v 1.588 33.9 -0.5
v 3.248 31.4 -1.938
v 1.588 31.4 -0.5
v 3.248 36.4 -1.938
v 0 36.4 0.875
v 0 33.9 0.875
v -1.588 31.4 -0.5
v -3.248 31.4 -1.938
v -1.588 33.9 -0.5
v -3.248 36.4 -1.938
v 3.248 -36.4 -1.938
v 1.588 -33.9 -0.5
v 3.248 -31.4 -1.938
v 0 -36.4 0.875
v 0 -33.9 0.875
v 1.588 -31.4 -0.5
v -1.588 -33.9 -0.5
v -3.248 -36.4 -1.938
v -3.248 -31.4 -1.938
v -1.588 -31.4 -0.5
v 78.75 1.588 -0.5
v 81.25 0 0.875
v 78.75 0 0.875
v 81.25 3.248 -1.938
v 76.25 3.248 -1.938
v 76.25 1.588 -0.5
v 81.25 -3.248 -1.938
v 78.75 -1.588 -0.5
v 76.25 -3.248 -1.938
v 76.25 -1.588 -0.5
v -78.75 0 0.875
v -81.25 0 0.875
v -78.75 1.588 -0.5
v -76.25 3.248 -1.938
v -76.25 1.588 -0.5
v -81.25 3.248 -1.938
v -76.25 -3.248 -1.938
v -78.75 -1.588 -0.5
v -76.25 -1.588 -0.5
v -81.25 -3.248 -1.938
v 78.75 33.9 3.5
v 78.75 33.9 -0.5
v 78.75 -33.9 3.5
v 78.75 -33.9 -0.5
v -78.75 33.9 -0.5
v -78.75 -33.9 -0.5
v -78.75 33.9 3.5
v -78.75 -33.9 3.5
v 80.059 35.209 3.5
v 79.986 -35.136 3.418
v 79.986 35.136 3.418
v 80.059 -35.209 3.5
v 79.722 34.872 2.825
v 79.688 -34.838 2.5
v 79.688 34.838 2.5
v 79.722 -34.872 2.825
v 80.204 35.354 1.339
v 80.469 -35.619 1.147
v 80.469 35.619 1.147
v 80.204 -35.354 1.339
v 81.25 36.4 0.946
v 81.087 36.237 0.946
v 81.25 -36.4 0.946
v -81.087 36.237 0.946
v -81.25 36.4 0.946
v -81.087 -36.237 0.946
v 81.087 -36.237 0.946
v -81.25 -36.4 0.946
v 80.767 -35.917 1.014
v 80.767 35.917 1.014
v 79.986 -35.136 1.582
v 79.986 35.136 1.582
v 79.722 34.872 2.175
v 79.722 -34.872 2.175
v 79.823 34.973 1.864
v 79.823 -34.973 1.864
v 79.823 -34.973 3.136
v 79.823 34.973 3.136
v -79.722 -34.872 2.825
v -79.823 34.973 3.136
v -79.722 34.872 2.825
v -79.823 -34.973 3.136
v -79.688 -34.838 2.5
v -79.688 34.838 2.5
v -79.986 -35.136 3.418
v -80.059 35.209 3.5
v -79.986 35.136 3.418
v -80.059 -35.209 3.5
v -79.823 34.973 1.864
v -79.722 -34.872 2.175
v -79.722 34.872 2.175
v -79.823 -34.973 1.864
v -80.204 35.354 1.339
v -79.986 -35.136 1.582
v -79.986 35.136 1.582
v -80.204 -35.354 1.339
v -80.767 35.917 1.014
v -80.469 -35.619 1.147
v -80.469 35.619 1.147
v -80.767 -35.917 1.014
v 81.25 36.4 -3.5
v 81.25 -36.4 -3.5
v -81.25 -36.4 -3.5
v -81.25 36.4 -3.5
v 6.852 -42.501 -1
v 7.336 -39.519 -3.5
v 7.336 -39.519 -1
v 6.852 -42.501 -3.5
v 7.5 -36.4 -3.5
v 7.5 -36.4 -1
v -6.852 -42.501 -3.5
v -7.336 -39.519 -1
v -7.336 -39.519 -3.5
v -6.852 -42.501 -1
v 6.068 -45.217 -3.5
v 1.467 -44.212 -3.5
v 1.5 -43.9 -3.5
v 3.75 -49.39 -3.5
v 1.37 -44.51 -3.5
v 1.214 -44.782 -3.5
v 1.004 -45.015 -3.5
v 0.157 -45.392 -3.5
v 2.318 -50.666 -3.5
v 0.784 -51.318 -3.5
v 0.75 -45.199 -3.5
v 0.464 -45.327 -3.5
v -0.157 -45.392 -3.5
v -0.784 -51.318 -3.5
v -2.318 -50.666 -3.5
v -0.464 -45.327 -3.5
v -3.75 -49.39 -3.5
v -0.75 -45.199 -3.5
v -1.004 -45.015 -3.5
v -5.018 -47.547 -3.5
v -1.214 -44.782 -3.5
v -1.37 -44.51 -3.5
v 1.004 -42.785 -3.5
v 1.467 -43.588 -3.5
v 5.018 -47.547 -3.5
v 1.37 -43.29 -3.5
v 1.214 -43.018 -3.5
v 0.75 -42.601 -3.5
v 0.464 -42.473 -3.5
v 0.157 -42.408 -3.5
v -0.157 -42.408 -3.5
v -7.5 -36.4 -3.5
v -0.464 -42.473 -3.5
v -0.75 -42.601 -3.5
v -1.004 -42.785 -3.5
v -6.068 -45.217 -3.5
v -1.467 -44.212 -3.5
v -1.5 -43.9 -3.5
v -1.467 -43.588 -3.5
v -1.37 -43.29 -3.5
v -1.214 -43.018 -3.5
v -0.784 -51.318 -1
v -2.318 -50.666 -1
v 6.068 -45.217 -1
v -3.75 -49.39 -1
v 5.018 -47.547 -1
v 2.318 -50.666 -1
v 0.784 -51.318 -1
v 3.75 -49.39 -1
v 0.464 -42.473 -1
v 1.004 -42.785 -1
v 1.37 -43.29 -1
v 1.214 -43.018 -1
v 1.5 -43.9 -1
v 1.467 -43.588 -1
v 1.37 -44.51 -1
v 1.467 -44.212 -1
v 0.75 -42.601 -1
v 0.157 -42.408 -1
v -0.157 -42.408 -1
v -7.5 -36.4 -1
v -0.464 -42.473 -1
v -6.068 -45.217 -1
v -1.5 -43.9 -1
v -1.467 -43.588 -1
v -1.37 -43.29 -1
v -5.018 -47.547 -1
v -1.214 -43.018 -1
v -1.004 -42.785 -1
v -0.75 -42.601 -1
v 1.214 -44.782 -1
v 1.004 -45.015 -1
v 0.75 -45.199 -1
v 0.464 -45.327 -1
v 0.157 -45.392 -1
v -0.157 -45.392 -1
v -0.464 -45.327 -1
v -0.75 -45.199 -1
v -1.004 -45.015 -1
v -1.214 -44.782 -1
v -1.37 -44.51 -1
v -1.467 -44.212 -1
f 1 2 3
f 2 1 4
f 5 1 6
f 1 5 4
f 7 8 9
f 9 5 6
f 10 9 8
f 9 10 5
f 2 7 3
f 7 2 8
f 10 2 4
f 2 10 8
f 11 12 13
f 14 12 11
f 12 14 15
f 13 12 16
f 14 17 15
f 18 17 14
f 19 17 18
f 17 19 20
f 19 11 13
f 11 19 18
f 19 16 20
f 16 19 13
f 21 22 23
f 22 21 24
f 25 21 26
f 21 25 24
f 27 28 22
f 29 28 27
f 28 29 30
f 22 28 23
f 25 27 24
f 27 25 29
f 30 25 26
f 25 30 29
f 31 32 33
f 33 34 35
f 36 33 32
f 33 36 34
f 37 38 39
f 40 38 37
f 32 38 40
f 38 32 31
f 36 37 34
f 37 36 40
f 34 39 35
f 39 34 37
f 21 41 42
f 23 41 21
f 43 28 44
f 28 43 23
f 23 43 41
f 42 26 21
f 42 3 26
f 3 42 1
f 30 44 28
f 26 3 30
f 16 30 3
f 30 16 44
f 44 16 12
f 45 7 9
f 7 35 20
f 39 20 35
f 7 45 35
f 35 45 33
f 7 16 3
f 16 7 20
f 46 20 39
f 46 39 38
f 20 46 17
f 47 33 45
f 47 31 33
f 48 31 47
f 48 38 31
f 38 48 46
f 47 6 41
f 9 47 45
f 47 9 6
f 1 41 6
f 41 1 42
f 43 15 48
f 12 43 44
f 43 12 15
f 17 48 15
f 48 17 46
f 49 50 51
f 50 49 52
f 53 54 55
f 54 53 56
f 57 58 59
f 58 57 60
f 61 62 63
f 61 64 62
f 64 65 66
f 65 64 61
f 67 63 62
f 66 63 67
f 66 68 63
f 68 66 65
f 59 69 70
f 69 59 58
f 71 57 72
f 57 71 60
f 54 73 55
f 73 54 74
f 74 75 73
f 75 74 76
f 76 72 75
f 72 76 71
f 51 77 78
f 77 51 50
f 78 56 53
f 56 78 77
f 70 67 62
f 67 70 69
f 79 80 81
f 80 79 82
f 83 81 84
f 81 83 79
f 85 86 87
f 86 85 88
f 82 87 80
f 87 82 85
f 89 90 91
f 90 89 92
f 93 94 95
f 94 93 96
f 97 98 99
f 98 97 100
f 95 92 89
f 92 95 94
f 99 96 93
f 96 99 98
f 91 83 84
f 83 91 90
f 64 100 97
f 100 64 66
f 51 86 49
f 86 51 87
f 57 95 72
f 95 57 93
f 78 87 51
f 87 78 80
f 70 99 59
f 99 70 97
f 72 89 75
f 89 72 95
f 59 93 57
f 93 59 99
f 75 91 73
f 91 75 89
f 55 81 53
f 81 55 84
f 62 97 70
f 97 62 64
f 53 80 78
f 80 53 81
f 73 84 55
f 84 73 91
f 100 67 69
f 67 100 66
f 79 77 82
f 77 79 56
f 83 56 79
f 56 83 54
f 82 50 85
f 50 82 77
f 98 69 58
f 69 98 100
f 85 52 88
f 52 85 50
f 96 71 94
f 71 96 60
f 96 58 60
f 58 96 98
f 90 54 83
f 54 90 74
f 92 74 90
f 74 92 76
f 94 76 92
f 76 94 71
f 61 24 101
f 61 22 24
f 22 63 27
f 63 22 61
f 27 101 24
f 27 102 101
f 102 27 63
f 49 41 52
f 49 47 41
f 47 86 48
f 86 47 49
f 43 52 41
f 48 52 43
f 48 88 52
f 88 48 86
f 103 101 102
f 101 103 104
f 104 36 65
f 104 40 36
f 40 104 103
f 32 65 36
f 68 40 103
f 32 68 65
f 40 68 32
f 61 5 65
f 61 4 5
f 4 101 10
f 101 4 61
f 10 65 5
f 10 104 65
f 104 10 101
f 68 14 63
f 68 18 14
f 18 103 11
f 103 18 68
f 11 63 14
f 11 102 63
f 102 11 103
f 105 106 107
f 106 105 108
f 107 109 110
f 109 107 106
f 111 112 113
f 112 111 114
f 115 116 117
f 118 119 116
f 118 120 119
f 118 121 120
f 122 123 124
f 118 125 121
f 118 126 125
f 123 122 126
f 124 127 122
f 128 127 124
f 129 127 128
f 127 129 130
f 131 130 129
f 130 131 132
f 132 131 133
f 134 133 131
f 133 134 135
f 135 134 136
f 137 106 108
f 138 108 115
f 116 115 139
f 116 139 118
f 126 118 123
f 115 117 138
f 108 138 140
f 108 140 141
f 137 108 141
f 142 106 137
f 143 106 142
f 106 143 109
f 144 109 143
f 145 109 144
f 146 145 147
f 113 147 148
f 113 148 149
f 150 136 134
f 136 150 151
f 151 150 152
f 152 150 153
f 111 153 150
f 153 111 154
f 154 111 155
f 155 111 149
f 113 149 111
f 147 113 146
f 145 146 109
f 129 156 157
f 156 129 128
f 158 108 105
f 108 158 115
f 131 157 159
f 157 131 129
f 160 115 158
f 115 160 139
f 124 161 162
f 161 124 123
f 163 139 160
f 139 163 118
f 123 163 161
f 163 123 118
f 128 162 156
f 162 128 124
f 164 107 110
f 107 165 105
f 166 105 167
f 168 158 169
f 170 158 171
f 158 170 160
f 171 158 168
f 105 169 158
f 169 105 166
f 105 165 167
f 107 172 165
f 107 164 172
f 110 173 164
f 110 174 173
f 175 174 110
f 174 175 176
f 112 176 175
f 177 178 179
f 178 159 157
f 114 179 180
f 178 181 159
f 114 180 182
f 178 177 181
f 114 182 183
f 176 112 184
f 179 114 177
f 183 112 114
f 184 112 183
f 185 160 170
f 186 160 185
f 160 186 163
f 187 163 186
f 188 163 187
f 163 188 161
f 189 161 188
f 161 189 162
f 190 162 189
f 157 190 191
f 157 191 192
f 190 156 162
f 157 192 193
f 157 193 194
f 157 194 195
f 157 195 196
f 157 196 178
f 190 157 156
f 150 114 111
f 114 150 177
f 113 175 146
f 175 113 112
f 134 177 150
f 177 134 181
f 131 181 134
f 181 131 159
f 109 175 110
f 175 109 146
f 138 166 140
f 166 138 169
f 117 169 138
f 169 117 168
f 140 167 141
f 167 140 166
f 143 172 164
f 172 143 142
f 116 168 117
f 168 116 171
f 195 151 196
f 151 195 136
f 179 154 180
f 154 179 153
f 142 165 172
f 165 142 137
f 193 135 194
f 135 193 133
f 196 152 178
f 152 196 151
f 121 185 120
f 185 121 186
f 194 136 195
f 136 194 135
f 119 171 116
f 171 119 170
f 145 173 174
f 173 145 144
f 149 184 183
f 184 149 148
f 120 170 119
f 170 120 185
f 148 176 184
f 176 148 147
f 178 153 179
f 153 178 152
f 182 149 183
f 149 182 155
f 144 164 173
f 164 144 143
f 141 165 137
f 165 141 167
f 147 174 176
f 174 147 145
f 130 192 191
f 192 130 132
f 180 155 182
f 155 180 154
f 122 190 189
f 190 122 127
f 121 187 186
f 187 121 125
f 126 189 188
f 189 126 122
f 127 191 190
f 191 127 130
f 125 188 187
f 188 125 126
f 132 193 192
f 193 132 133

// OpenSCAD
//------------------Variables------------------\\ 

		//----Global Values----\\
			//The default unit in OpenSCAD is mm and this unit variable allows one to change the variables in the code with units other than mm. Default is 1, for mm, but cm is 10 and inches is 25.4. Note that this entails that you change EVERY variable (except maybe sfn)  so that one piece of the model is not ridiculously bigger/smaller than the other parts. 
				unit=1;

			//The detail in the cylinders/spheres of the shape.
				sfn=30;

		//----Bill Specifics----\\

			//The length of the bill.
				billength= 157.5;

			//The width of the bill. 
				billwidth = 67.8;

			//The thickness of the frame. 
				framethick = 5;
			
			//Bottom Thickness
				botthick = 2 ;

		//----Frame Specifics----\\

			//The border of the frame length-wise. This is the measurement from the inside of the frame to the outisde on the length (x) axis. The cylinders that shape the frame use this measurement.
				xframe = 5;

			//The border of the frame width-wise. This is the measurement from the inside of the frame to the outisde on the width (y) axis.
				yframe = 5;
		
			//How prominent the frame shaping is. Play with this value. Default is 2.
				frameshapethick = 1.6;

			//How raised the frame shaping is. Play with this value as well. 
				frameshaperaise = 0;
		
	//----Paper clip slit size----\\\
		//Width of the paperclip slit. Adjust this value if as you want. 
		slitwidth = 10;
		
		//Height of the slit. This is actually a size control but it mainly changes the size.
		slitheight = 7.5;

		//Where the slit is. Slit is in the middle by default but depending on size you may have to raise or lower this value.
		slitlift =-3;

		//Shape of slit in sides. Default is 3 (triangle) as its overhangs are not unbearable.
		slitshape=3;

		//Slit scale (x,y,z)
		slitscalex= 0.5;
		slitscaley= 1;
		slitscalez= 1;
	
	//----Hook sizing----\\
		//Hook size
		hooksize=15;

		//Hook hole size
		hookhole=3;

		//Hook thickness
		hookthick=2.5;

//-------------------Modules-------------------\\ 

	//----Basic Frame Shapes----\\
		module bill() {
			cube([billength*unit, billwidth*unit,framethick*unit], center=true);
		}

		module outsideframe() { 
			cube([(billength+xframe)*unit, (billwidth+yframe)*unit, (framethick+botthick)*unit], center=true);
		}

	//----Frame shaping.----\\
		//Frame shaping cylinder on the X Axis.
			module xfsc() {
				cylinder(r=(framethick*unit)/(frameshapethick*2), h=(billwidth+yframe)*unit+xframe, center=true, $fn=sfn);
			}

		//Frame shaping cylinder on the Y Axis.
			module yfsc() {
				cylinder(r=(framethick*unit)/(frameshapethick*2), h=(billength+xframe)*unit+yframe, center=true, $fn=sfn);
			}

		//Frameshaping general module
			module frameshaping() {
				translate([(billength/2)*unit+xframe/2, 0, (framethick/2)*unit]) {
					rotate([90,0,0]) {
						xfsc();
					}
				}
				translate([(-billength/2)*unit-xframe/2, 0, (framethick/2)*unit]) {
					rotate([90,0,0]) {
						xfsc();
					}
				}

				translate([0, (billwidth/2)*unit+yframe/2, (framethick/2)*unit]) {
					rotate([90,0,90]) {
						yfsc();
					}
				}
				translate([0, (-billwidth/2)*unit-yframe/2, (framethick/2)*unit]) {
					rotate([90,0,90]) {
						yfsc();
					}
				}
			}

	



	//A slit on every side for a paper clip to hold it down
	module clipslit() {
		translate([0, ((billwidth+yframe)/2)*unit, slitlift*unit]) {
			rotate([0,270,90]) {
				scale([slitscalex,slitscaley,slitscalez]) {
					cylinder(r=(slitheight/2)*unit, h=slitwidth*unit, $fn=slitshape, center=true);
				}
			}
		}
		translate([0, ((billwidth+yframe)/2)*-unit, slitlift*unit]) {
			rotate([0,270,90]) {
				scale([slitscalex,slitscaley,slitscalez]) {
					cylinder(r=(slitheight/2)*unit, h=slitwidth*unit, $fn=slitshape, center=true);
				}
			}
		}
		translate([((billength+xframe)/2)*unit, 0, slitlift*unit]) {
			rotate([0,270,0]) {
				scale([slitscalex,slitscaley,slitscalez]) {
					cylinder(r=(slitheight/2)*unit, h=slitwidth*unit, $fn=slitshape, center=true);
				}
			}
		}
		translate([-unit*((billength+xframe)/2), 0, slitlift*unit]) {
			rotate([0,270,0]) {
				scale([slitscalex,slitscaley,slitscalez]) {
					cylinder(r=(slitheight/2)*unit, h=slitwidth*unit, $fn=slitshape, center=true);
				}
			}
		}				
	}

		
	module hook() {
		translate([0,-((billwidth+xframe)/2)*unit, (-(framethick+botthick)/2)*unit ]) {
			difference() {
				scale([1,2,1]) {
					cylinder(r=(hooksize/2)*unit, h=hookthick*unit, $fn=sfn);
				}
				translate([(-hooksize/2)*unit, 0]) {
					cube([hooksize*unit, hooksize*unit, hookthick*unit]);
				}
				translate([0, (-hooksize/2)*unit, 0]) {
					cylinder(r=(hookhole/2)*unit, h=hookthick*unit, $fn=sfn);
				}
			}
		}
	}


	//Plating module
	module frame() {
		difference() {
			outsideframe();
			translate([0,0, botthick]) {
				bill();
				clipslit();
			}
			translate([0,0, frameshaperaise]) {
				frameshaping();
			}
		}
	}

frame();
hook();
